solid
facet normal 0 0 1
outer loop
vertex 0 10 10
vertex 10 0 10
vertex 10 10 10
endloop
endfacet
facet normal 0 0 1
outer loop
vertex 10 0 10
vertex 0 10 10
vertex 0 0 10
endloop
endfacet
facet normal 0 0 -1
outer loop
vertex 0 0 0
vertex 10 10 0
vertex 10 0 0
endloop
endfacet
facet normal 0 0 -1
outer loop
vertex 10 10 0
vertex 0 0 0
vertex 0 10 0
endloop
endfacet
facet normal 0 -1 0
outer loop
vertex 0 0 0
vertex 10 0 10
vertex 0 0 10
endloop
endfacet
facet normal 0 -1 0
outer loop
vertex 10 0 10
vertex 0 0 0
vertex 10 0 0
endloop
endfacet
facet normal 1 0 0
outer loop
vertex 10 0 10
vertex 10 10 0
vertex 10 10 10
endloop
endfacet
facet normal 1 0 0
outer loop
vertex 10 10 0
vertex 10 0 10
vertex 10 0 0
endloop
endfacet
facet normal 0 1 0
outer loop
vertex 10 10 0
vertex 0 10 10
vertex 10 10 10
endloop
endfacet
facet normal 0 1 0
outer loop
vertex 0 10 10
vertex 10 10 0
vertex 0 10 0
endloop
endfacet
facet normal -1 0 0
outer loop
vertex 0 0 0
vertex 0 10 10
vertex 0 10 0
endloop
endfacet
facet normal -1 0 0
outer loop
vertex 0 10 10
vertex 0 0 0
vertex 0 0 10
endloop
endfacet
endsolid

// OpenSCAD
color([ 128/255, 0/255, 0/255 ])
   cube(size=[10,10,10],center=false);
